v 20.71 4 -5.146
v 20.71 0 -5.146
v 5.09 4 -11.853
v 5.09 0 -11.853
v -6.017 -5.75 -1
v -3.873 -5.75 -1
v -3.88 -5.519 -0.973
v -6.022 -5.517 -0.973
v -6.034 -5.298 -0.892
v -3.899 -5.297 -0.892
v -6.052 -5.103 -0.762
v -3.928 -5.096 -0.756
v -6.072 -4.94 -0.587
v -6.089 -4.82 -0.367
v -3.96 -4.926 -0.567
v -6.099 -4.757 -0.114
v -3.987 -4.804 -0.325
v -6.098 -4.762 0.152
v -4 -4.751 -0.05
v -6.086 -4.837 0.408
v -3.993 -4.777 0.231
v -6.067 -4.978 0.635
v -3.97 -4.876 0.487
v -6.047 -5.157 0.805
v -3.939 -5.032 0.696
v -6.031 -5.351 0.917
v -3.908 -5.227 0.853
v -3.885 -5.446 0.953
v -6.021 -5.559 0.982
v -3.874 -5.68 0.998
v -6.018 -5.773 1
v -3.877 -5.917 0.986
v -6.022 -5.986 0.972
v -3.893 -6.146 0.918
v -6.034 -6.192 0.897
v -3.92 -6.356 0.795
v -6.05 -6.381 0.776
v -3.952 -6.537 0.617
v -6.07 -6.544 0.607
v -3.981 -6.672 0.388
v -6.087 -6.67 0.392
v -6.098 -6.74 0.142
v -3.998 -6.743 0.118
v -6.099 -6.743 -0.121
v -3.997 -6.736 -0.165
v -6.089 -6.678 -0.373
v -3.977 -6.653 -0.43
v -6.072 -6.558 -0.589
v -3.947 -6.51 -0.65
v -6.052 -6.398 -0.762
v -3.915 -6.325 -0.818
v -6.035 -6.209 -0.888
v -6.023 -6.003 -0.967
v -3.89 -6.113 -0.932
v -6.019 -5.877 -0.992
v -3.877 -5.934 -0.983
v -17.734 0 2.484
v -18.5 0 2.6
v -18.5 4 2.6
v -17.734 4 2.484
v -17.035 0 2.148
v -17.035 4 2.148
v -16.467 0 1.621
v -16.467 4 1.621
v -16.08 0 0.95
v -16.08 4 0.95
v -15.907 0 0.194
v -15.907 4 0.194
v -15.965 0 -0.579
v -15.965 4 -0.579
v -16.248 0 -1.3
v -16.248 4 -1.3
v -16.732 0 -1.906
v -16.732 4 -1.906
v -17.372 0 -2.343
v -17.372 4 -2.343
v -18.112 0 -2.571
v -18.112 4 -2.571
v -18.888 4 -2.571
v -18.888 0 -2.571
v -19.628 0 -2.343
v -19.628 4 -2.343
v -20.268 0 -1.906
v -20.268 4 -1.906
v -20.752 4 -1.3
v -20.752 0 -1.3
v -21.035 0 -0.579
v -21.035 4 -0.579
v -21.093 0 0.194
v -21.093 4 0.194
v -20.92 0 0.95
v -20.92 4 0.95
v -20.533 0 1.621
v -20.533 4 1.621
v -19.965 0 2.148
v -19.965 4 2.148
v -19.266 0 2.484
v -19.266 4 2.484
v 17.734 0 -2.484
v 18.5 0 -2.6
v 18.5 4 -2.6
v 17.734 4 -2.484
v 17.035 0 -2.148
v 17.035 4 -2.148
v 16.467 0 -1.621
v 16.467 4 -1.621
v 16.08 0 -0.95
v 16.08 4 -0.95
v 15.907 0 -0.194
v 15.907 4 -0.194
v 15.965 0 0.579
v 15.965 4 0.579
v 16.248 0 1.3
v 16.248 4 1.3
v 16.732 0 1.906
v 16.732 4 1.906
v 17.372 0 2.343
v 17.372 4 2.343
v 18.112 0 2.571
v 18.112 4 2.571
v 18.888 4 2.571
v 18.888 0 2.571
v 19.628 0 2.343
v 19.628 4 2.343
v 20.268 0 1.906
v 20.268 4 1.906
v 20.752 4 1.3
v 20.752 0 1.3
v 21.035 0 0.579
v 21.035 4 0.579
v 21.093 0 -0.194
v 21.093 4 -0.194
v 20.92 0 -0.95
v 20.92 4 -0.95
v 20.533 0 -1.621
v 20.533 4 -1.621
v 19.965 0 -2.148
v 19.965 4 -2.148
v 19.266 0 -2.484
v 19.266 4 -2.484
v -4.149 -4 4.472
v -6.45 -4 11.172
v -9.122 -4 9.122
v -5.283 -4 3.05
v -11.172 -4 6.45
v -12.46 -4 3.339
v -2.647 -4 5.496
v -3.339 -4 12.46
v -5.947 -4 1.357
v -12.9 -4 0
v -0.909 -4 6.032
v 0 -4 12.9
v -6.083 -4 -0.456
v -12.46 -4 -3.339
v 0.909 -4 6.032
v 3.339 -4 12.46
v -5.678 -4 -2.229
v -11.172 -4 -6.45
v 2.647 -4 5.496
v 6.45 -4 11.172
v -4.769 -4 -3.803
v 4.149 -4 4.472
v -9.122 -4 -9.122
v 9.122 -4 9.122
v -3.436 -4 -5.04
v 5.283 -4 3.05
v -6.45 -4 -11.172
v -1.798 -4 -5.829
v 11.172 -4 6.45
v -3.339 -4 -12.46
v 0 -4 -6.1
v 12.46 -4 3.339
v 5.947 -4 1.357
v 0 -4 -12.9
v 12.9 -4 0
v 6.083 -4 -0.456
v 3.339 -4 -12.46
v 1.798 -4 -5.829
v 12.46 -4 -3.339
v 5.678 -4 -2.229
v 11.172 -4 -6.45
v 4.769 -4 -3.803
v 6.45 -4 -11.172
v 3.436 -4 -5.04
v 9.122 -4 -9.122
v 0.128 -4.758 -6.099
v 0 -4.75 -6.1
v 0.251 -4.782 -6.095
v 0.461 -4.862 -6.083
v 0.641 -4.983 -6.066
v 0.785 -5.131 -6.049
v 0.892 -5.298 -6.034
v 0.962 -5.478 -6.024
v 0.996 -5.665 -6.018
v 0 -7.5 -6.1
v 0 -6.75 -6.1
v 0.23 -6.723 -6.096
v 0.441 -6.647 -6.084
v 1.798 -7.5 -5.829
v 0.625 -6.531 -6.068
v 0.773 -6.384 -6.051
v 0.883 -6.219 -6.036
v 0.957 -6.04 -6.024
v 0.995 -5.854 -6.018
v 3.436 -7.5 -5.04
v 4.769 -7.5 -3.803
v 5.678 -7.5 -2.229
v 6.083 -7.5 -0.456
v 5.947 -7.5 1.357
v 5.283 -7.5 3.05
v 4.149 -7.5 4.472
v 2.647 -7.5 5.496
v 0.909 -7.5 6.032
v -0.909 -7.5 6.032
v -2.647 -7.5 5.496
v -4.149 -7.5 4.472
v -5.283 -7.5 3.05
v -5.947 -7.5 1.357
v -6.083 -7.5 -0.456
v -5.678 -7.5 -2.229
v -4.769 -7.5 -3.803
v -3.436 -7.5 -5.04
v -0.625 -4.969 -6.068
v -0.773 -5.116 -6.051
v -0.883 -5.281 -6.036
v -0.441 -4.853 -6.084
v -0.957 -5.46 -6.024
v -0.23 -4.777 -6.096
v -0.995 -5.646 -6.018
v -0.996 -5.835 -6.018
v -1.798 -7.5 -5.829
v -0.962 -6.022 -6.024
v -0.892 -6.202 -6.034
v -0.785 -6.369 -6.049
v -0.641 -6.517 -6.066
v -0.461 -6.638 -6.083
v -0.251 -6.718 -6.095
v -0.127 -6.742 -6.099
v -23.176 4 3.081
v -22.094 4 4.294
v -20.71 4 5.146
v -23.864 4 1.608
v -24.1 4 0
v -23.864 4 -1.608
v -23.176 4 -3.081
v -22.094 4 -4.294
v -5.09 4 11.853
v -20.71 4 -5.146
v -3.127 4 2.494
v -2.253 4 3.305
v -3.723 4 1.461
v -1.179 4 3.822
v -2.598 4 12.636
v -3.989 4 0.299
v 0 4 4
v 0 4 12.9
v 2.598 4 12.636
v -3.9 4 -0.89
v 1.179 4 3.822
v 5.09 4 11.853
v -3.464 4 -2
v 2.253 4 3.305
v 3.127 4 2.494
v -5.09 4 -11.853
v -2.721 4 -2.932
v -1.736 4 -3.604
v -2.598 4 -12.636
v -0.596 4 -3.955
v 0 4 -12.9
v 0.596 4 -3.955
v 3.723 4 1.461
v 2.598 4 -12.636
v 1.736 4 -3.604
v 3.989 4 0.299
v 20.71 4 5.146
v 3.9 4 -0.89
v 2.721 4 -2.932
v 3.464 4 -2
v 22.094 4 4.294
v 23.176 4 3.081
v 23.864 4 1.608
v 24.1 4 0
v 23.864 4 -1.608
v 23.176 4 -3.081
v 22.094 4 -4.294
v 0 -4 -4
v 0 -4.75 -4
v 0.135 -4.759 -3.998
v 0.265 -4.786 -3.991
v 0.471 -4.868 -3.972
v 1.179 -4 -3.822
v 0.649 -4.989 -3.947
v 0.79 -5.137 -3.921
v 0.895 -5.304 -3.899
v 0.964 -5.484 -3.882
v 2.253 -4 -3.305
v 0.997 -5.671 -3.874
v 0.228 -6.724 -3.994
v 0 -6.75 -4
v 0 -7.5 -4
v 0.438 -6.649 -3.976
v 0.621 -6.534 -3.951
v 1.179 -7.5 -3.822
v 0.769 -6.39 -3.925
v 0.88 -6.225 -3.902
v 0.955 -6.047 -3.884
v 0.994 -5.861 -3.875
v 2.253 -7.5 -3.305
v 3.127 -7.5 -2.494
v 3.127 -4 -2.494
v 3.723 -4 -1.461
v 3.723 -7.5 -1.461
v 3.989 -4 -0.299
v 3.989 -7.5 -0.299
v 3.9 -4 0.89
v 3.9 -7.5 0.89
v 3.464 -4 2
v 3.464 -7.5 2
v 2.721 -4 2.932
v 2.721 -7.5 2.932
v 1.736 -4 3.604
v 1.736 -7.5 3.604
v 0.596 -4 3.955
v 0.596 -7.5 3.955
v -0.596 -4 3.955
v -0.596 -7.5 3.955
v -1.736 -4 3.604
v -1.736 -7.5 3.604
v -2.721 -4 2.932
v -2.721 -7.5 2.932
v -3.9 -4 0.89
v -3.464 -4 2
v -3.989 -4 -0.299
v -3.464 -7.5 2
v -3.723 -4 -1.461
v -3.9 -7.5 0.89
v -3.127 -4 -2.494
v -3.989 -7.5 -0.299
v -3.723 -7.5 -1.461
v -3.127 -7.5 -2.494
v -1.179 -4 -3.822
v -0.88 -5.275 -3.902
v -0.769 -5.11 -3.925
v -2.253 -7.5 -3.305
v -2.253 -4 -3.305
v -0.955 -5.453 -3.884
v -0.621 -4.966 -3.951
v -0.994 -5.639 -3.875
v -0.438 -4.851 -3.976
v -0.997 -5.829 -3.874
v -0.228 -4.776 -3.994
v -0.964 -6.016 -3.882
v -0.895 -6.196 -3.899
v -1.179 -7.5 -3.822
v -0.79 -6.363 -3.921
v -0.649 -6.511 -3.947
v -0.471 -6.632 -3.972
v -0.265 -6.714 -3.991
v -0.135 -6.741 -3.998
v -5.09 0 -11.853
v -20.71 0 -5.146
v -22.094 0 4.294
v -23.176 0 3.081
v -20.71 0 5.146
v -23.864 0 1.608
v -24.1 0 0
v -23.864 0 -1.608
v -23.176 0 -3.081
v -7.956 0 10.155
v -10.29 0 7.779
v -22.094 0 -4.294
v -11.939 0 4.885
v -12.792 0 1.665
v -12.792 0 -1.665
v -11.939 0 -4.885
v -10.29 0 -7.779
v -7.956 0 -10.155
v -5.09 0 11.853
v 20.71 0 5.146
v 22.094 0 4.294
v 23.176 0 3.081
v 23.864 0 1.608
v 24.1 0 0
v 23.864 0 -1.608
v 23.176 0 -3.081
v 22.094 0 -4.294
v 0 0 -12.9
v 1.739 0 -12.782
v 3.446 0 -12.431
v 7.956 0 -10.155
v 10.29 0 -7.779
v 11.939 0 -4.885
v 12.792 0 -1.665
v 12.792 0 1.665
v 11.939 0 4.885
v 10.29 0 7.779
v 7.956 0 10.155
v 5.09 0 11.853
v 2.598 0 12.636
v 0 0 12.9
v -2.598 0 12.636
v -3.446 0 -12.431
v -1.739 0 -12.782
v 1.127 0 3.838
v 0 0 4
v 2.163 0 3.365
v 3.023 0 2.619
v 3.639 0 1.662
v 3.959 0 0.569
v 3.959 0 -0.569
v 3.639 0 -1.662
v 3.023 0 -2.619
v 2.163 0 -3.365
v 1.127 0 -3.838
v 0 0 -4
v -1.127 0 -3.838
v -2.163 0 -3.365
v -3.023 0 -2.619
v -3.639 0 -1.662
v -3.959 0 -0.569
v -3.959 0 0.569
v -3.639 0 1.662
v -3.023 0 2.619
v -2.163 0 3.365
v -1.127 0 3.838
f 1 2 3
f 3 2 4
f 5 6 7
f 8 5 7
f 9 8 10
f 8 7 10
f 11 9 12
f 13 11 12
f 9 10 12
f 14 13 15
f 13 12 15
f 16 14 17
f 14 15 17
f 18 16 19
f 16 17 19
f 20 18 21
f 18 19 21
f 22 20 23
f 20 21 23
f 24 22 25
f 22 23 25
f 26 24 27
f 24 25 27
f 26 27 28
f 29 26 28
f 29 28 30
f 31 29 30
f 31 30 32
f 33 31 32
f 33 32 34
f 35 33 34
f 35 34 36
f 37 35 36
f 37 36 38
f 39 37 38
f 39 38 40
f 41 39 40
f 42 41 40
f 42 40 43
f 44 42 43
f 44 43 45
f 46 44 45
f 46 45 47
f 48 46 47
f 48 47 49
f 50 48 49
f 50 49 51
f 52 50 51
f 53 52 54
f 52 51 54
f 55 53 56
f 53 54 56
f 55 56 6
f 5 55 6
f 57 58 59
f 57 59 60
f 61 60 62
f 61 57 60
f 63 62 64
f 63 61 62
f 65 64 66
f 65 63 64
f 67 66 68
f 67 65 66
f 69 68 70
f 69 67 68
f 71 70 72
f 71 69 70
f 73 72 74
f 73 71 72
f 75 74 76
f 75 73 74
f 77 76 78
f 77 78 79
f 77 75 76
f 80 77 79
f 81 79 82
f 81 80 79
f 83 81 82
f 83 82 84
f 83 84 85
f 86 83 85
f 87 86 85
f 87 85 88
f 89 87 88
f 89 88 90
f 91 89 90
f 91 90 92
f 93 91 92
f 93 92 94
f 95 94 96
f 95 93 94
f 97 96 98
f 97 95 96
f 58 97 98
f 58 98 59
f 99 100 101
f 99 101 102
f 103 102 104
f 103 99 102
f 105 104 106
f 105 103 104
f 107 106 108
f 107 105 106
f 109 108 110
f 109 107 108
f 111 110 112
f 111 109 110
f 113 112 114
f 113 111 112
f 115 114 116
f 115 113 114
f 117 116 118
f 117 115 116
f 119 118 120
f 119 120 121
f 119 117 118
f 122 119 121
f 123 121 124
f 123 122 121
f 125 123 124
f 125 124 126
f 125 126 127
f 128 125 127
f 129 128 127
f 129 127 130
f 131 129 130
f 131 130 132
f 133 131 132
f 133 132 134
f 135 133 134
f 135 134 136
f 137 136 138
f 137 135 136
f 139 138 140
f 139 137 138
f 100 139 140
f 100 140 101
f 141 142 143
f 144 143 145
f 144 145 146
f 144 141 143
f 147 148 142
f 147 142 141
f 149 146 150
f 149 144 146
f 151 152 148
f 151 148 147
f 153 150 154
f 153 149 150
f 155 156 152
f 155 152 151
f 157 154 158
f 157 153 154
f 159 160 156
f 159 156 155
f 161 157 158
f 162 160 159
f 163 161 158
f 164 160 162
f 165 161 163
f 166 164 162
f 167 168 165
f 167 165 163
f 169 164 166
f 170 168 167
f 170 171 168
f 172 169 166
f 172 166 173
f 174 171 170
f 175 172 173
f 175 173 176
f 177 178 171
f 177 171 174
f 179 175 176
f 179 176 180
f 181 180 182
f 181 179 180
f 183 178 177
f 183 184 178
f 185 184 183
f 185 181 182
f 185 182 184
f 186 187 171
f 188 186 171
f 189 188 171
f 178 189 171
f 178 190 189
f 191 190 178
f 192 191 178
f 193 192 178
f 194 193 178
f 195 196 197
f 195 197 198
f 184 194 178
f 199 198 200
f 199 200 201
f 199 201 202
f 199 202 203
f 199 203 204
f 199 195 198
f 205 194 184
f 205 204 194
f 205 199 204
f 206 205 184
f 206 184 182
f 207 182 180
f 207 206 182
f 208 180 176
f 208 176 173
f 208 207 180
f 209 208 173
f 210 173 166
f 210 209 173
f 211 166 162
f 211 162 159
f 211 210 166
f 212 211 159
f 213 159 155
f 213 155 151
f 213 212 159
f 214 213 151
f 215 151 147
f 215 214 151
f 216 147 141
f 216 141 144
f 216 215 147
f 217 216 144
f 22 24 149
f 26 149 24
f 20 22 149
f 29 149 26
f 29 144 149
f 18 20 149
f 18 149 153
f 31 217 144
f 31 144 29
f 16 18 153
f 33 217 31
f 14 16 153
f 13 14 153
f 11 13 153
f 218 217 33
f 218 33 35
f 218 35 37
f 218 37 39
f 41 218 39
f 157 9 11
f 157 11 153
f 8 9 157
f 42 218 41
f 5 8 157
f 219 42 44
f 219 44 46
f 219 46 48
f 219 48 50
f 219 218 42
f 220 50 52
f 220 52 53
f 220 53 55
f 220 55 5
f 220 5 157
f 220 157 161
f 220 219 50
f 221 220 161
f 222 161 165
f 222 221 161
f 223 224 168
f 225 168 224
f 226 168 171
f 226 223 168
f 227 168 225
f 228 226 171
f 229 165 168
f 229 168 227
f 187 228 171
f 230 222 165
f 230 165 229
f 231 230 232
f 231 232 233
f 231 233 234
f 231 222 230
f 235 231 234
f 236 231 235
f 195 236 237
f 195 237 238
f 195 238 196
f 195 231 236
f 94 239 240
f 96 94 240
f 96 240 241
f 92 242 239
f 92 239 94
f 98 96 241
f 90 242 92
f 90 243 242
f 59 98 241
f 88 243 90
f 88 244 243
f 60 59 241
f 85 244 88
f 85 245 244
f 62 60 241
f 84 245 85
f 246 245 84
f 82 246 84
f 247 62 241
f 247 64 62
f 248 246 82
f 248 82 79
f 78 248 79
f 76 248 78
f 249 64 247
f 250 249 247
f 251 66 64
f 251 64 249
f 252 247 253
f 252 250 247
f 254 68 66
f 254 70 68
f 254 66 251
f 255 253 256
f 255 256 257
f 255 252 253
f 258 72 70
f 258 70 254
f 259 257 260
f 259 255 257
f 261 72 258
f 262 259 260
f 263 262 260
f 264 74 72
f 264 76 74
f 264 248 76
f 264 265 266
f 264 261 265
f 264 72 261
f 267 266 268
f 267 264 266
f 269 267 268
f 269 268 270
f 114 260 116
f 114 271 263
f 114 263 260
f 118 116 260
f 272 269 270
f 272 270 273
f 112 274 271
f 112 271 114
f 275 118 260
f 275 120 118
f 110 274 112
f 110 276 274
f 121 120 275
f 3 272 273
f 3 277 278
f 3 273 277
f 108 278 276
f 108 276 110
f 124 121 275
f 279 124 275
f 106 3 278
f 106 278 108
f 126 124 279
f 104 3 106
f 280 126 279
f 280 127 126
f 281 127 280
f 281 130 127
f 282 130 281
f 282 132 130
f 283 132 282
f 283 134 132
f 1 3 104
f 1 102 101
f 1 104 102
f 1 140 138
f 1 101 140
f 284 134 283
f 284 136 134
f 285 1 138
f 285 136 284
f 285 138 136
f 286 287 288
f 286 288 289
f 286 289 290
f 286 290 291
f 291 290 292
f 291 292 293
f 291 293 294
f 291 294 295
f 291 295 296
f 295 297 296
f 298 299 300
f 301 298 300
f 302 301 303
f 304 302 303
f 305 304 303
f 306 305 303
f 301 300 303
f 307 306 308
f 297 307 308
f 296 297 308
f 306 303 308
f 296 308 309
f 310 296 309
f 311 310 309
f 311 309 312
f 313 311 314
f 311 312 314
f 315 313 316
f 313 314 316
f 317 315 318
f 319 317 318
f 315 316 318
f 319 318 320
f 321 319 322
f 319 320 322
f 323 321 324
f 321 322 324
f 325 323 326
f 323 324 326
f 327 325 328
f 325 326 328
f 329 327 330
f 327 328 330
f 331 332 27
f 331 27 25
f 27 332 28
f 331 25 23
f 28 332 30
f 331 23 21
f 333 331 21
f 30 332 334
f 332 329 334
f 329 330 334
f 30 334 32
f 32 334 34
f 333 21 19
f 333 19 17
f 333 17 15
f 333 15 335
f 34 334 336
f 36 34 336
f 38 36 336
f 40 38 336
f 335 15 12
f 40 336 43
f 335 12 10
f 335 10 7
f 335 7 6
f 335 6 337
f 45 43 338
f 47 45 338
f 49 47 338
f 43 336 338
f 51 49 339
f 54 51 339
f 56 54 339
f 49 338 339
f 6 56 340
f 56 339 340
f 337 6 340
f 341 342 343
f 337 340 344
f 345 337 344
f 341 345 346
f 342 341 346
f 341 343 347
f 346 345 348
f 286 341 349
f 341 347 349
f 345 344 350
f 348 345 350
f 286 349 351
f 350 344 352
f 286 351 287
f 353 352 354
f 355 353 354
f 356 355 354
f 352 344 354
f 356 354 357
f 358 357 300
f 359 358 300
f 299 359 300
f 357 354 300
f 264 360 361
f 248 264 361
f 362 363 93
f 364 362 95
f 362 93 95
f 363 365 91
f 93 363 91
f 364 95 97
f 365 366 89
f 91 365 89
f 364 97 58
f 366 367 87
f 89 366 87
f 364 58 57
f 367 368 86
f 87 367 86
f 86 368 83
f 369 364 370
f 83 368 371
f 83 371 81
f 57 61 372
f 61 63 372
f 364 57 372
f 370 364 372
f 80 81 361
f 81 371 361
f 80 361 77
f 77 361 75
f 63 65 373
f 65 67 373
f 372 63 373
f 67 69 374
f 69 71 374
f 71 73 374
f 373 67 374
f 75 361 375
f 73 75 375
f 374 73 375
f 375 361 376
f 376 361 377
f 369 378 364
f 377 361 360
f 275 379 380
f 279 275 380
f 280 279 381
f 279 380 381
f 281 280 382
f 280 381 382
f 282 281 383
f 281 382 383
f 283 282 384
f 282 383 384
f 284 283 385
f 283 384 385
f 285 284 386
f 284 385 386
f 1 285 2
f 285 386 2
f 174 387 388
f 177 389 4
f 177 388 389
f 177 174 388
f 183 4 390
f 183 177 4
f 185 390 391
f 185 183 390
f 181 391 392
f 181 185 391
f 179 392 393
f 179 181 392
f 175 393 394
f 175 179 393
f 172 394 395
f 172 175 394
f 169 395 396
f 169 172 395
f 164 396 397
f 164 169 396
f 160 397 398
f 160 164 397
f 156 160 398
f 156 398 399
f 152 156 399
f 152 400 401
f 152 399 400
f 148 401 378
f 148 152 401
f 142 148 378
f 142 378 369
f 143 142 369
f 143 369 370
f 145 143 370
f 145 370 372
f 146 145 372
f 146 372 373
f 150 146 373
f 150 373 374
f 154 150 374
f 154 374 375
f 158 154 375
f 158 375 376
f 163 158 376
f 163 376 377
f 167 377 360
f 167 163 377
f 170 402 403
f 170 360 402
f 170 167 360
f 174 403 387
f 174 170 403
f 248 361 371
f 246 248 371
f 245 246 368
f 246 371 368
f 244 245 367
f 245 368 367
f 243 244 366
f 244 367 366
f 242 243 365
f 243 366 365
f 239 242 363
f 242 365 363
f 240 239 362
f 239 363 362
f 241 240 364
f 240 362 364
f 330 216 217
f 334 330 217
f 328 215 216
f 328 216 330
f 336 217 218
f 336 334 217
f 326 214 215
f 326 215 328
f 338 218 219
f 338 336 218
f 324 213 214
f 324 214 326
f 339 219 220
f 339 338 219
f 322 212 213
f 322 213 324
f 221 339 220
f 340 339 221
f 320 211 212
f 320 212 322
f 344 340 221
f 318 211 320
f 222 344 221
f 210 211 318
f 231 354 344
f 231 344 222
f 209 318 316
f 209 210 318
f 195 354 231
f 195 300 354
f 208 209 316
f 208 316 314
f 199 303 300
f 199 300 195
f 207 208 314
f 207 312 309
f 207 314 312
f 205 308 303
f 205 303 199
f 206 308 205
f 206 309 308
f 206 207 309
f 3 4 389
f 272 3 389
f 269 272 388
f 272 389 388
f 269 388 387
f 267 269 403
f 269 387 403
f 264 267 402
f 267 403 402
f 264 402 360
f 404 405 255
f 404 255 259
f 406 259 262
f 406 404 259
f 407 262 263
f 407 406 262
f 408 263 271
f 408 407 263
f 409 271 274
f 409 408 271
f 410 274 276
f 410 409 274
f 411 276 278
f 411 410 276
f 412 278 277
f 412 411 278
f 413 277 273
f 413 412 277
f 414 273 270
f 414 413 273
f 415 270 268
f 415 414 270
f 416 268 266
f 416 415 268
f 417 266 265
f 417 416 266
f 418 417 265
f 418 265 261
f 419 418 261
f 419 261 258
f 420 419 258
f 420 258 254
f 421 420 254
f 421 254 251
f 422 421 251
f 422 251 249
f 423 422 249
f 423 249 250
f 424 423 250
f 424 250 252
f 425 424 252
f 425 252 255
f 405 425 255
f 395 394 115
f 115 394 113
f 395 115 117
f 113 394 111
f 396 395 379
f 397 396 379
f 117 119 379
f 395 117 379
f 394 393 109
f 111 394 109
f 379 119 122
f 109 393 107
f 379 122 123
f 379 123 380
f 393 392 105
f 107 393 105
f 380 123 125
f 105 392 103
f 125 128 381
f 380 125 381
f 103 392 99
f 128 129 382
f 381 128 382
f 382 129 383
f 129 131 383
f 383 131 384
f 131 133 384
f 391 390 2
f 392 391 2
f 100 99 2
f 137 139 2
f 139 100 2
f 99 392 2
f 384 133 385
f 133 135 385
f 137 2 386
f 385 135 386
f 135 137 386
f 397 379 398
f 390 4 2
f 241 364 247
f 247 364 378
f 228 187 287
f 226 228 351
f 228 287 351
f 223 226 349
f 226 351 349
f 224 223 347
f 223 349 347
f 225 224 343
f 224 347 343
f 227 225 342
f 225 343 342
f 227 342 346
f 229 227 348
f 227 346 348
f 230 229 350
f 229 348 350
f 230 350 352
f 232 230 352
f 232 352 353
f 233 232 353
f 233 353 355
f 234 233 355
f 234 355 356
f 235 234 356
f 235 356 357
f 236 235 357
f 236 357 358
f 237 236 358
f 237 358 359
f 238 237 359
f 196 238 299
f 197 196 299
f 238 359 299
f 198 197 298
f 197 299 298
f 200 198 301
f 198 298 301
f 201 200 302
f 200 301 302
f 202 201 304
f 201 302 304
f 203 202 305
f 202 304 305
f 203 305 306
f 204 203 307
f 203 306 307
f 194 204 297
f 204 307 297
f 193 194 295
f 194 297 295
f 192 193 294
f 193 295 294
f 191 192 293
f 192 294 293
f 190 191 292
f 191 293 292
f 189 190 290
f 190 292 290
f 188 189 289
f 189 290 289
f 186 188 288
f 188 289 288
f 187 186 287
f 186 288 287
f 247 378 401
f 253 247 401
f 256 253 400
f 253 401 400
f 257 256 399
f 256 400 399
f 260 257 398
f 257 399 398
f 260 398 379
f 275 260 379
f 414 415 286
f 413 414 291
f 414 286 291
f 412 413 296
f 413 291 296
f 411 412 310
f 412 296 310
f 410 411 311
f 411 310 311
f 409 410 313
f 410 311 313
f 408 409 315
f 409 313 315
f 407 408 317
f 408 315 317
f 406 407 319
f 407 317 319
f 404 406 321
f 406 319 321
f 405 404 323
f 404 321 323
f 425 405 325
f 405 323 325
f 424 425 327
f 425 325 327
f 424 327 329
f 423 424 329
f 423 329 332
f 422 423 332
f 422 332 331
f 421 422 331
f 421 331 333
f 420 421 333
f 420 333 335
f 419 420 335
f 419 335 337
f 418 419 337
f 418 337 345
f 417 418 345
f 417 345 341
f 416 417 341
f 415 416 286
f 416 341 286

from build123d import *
from build123d.topology import SkipClean

# Parameters (mm, degrees)
SKETCH_1_R          = 2.6
SKETCH_1_R_2        = 4
EXTRUDE_1_DEPTH     = 4
EXTRUDE_START       = 4
SKETCH_2_R          = 12.9
SKETCH_2_R_2        = 4
EXTRUDE_2_DEPTH     = 4
EXTRUDE_START_2     = 3.5
SKETCH_3_R          = 6.1
SKETCH_3_R_2        = 4
EXTRUDE_3_DEPTH     = 3.5
SKETCH_6_R          = 1
CUT_EXTRUDE_1_DEPTH = 10
SKETCH_7_R          = 1
CUT_EXTRUDE_2_DEPTH = 10


with BuildPart() as part:
    # 草图1 → 凸台-拉伸1 (new body)
    with BuildSketch(Plane(origin=(0, 0, 0), x_dir=(1, 0, 0), z_dir=(0, 1, 0))):
        with BuildLine():
            Line((-20.70972973, -5.145589813), (-5.09027027, -11.853233676))
            ThreePointArc((-5.09027027, -11.853233676), (0, -12.9), (5.09027027, -11.853233676))
            Line((5.09027027, -11.853233676), (20.70972973, -5.145589813))
            ThreePointArc((20.70972973, -5.145589813), (24.1, 0), (20.70972973, 5.145589813))
            Line((20.70972973, 5.145589813), (5.09027027, 11.853233676))
            ThreePointArc((5.09027027, 11.853233676), (0, 12.9), (-5.09027027, 11.853233676))
            Line((-5.09027027, 11.853233676), (-20.70972973, 5.145589813))
            ThreePointArc((-20.70972973, 5.145589813), (-24.1, 0), (-20.70972973, -5.145589813))
        make_face()
        with Locations(Location((-18.5, 0, 0), (0, 0, 270))):
            Circle(SKETCH_1_R, mode=Mode.SUBTRACT)
        with Locations(Location((18.5, 0, 0), (0, 0, 90))):
            Circle(SKETCH_1_R, mode=Mode.SUBTRACT)
        with Locations(Location((0, 0, 0), (0, 0, 270))):
            Circle(SKETCH_1_R_2, mode=Mode.SUBTRACT)
    extrude(amount=EXTRUDE_1_DEPTH)

    # 草图2 → 凸台-拉伸2 (add)
    with SkipClean():  # the faces are left unmerged after this step: merging them gives an invalid solid
        with BuildSketch(Plane.XZ.offset(EXTRUDE_START)):
            with Locations(Location((0, 0, 0), (0, 0, 270))):
                Circle(SKETCH_2_R)
            with Locations(Location((0, 0, 0), (0, 0, 270))):
                Circle(SKETCH_2_R_2, mode=Mode.SUBTRACT)
        extrude(amount=-EXTRUDE_2_DEPTH)

    # 草图3 → 凸台-拉伸3 (add)
    with SkipClean():  # the faces are left unmerged after this step: merging them gives an invalid solid
        with BuildSketch(Plane.XZ.offset(4).offset(EXTRUDE_START_2)):
            with Locations(Location((0, 0, 0), (0, 0, 270))):
                Circle(SKETCH_3_R)
            with Locations(Location((0, 0, 0), (0, 0, 270))):
                Circle(SKETCH_3_R_2, mode=Mode.SUBTRACT)
        extrude(amount=-EXTRUDE_3_DEPTH)

    # 草图6 → 切除-拉伸1 (cut)
    with SkipClean():  # the faces are left unmerged after this step: merging them gives an invalid solid
        with BuildSketch(Plane.XY):
            with Locations(Location((0, -5.75, 0), (0, 0, 90))):
                Circle(SKETCH_6_R)
        extrude(amount=-CUT_EXTRUDE_1_DEPTH, mode=Mode.SUBTRACT)

    # 草图7 → 切除-拉伸2 (cut)
    with SkipClean():  # the faces are left unmerged after this step: merging them gives an invalid solid
        with BuildSketch(Plane(origin=(0, 0, 0), x_dir=(0, 0, -1), z_dir=(1, 0, 0))):
            with Locations((0, -5.75)):
                Circle(SKETCH_7_R)
        extrude(amount=-CUT_EXTRUDE_2_DEPTH, mode=Mode.SUBTRACT)


solid = part.part
